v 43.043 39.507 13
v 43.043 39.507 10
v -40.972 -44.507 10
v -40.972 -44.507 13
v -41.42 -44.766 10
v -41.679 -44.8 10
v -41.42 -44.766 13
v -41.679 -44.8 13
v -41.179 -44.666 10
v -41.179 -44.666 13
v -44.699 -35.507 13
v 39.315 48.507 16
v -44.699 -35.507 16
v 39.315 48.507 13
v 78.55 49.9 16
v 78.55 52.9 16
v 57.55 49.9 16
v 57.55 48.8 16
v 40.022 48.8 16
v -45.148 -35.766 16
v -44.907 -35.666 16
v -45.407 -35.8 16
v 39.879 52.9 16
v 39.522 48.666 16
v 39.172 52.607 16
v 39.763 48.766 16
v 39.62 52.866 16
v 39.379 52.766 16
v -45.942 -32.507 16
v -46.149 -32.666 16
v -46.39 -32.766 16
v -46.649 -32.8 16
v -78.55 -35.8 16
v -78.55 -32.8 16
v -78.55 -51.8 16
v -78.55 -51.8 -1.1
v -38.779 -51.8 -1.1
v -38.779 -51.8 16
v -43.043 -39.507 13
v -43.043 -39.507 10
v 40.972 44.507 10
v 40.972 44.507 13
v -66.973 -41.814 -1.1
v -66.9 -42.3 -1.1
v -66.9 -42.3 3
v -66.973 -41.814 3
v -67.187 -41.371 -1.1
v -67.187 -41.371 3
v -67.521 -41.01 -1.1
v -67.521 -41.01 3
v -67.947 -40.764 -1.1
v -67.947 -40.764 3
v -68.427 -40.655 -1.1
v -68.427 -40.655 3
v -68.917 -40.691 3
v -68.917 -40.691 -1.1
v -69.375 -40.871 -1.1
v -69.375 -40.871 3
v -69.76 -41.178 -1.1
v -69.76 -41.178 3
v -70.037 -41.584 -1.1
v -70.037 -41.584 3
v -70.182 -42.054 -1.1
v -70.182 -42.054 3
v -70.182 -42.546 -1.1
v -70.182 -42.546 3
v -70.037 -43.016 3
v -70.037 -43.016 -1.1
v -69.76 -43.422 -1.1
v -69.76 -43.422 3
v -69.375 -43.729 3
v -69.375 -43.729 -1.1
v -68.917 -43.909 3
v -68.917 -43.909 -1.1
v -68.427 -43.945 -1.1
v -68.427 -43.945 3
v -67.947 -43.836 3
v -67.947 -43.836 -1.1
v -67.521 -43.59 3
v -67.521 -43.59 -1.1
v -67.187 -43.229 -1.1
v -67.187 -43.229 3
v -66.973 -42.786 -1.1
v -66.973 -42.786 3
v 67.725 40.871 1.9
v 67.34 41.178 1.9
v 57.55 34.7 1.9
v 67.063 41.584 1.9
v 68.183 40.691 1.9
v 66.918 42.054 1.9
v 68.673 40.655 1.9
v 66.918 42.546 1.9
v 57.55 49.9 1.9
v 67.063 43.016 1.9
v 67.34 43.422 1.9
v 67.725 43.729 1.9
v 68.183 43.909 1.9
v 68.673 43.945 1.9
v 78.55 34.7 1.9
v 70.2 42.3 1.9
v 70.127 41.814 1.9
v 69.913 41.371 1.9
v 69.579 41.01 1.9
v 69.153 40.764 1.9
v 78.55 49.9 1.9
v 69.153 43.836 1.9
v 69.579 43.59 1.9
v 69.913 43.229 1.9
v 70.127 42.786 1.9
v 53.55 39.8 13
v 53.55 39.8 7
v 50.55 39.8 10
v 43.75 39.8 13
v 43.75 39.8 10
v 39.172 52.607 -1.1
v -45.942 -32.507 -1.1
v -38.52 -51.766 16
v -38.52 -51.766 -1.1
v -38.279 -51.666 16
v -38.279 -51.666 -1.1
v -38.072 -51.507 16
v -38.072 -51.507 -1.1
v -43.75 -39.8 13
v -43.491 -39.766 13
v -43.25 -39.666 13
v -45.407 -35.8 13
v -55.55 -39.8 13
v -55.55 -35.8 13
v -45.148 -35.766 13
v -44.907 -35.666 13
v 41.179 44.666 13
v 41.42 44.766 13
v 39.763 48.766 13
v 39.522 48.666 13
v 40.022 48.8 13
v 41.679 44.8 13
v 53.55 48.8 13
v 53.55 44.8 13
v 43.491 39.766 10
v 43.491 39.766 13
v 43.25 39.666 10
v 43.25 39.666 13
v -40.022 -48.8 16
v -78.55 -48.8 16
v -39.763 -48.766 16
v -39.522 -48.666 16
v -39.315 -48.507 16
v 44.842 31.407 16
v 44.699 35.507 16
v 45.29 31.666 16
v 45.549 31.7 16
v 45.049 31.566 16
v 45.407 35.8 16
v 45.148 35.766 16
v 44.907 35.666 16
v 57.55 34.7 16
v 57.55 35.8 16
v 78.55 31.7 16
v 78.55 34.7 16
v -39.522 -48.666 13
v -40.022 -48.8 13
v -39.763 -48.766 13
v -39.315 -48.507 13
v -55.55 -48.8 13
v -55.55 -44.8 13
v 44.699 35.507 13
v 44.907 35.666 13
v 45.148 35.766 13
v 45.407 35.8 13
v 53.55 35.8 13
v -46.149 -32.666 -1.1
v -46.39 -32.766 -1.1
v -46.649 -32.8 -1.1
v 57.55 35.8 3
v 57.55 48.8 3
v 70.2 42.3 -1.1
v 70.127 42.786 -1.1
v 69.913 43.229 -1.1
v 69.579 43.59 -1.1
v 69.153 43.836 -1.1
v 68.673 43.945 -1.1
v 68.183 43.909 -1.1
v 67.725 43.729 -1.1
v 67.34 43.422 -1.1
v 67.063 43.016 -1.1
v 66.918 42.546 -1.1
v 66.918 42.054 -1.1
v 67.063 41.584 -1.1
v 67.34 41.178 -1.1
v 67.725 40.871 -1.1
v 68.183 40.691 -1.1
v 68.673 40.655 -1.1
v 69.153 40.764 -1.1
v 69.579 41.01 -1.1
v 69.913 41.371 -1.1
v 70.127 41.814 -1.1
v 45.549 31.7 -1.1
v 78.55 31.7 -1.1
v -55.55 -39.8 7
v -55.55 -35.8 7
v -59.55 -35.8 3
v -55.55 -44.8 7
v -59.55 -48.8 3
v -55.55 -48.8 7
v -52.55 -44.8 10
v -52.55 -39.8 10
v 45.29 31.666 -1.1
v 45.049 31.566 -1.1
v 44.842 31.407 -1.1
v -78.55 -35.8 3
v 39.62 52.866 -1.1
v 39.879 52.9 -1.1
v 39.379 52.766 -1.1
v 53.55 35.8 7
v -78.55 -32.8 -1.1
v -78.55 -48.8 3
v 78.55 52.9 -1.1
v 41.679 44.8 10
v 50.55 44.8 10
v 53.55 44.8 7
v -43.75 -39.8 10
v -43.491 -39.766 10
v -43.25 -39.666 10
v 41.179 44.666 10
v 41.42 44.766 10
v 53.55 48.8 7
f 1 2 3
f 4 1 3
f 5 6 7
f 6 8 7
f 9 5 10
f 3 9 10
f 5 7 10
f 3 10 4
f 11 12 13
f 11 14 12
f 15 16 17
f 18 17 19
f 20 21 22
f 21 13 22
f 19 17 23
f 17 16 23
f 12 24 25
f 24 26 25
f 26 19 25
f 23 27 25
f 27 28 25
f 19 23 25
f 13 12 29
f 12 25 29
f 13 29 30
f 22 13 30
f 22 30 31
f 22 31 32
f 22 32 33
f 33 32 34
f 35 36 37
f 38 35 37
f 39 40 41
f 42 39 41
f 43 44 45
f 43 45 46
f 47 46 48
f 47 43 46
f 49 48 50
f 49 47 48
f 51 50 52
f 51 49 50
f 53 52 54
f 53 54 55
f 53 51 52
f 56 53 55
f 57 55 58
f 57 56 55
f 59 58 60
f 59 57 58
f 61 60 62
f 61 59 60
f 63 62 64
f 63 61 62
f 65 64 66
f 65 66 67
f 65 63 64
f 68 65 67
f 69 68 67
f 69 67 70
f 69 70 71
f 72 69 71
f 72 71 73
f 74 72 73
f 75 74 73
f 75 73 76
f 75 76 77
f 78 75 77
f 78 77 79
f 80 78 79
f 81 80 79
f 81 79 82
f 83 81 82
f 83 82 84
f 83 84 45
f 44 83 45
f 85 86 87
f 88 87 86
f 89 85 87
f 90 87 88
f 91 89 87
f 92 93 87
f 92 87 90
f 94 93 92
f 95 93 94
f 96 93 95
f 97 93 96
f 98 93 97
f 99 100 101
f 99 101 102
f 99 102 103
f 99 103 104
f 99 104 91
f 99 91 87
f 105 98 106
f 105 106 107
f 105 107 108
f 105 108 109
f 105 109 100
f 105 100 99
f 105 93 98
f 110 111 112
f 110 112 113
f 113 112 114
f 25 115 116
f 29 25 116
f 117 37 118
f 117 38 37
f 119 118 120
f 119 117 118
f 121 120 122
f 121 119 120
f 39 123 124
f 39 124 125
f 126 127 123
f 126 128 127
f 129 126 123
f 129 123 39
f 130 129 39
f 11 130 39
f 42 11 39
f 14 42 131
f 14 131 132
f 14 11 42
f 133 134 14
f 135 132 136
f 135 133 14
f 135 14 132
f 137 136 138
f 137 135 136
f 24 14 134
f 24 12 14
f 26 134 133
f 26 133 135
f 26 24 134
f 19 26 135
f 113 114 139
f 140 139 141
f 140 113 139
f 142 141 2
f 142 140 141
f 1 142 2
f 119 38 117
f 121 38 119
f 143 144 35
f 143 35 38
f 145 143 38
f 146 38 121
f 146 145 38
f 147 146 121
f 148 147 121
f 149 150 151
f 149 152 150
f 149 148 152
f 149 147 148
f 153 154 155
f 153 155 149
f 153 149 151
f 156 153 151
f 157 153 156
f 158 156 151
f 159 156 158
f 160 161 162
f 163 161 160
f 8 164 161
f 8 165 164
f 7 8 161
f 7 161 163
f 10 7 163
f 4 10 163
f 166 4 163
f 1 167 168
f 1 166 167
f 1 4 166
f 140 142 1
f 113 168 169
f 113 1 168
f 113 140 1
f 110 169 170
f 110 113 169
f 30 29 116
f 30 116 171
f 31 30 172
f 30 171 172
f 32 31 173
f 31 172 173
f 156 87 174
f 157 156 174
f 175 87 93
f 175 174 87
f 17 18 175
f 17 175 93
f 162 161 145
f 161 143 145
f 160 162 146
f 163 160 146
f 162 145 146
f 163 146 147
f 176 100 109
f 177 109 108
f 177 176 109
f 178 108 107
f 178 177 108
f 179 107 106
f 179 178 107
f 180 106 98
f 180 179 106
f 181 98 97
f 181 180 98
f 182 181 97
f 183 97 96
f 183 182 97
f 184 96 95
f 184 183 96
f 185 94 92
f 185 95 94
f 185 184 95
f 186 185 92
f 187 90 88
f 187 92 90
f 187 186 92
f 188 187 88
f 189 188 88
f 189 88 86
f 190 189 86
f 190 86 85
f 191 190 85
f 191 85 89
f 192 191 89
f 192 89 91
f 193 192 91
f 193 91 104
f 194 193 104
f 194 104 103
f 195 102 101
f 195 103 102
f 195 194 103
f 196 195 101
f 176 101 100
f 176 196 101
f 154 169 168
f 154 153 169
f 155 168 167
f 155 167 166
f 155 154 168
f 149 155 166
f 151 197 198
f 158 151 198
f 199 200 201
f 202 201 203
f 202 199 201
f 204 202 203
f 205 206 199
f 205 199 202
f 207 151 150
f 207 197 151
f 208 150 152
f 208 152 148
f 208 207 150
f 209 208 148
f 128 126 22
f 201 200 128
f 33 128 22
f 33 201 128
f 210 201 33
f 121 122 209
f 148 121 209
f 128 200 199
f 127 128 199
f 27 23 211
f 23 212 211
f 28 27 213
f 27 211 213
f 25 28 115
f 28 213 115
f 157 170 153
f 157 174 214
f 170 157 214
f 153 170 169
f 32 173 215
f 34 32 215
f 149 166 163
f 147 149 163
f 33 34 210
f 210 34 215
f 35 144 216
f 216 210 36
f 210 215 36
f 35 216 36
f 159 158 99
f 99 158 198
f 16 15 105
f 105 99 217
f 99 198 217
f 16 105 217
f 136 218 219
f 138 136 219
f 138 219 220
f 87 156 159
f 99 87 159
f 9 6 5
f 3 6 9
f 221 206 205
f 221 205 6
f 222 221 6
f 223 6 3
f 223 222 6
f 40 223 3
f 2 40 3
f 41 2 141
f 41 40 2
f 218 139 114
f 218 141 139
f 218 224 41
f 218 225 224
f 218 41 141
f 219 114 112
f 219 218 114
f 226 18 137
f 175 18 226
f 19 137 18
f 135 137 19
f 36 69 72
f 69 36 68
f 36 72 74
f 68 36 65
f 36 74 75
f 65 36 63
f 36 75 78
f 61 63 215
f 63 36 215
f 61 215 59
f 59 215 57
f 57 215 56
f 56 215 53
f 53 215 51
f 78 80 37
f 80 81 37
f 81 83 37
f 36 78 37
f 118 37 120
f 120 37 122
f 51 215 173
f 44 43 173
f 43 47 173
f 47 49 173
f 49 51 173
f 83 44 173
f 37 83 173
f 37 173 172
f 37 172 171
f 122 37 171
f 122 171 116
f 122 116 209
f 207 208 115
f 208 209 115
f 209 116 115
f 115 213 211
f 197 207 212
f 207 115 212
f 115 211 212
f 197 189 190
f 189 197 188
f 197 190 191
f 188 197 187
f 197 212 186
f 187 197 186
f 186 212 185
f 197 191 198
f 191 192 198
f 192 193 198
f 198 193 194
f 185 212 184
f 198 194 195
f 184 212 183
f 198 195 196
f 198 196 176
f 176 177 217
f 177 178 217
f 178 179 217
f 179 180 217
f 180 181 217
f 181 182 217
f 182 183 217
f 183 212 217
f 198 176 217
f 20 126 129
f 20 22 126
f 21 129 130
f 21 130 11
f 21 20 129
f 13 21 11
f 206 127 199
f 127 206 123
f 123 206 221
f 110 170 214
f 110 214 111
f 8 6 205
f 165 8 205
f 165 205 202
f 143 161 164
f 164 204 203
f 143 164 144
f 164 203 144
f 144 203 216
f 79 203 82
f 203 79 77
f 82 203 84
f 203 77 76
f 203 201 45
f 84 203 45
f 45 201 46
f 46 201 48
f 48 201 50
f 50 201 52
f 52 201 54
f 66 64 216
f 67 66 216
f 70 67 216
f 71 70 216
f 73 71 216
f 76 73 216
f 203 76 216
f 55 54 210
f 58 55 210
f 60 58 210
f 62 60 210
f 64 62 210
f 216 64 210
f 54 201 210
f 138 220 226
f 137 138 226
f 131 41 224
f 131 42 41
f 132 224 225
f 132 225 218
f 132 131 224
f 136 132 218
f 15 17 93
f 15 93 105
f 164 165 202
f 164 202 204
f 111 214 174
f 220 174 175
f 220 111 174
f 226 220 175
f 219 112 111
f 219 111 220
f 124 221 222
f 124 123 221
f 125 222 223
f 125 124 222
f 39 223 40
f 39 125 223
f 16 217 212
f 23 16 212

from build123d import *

# Parameters (mm, degrees)
SKETCH_10_R         = 1.65
EXTRUDE_1_DEPTH     = 3
EXTRUDE_START       = 3
EXTRUDE_2_DEPTH     = 7
EXTRUDE_3_DEPTH     = 13
CHAMFER_1_SIZE      = 7
EXTRUDE_5_DEPTH     = 10
EXTRUDE_START_2     = -1.1
SKETCH_16_R         = 1.65
EXTRUDE_6_DEPTH     = 4.1
EXTRUDE_7_DEPTH     = 16
SKETCH_18_W         = 21
SKETCH_18_H         = 15.2
CUT_EXTRUDE_1_DEPTH = 14.1
FILLET_1_R          = 1


with BuildPart() as part:
    # 草图10 → 凸台-拉伸1 (new body)
    with BuildSketch(Plane.XY):
        Polygon((-78.55, -32.8), (-46.235028843, -32.8), (38.364971157, 51.8), (78.55, 51.8), (78.55, 32.8), (46.235028843, 32.8), (-38.364971157, -51.8), (-78.55, -51.8), align=None)
        with Locations((-68.55, -42.3)):
            Circle(SKETCH_10_R, mode=Mode.SUBTRACT)
        with Locations((68.55, 42.3)):
            Circle(SKETCH_10_R, mode=Mode.SUBTRACT)
    extrude(amount=EXTRUDE_1_DEPTH)

    # 草图11 → 凸台-拉伸2 (add)
    with BuildSketch(Plane.XY.offset(EXTRUDE_START)):
        Polygon((-59.55, -32.8), (-59.55, -51.8), (-38.364971157, -51.8), (46.235028843, 32.8), (57.55, 32.8), (57.55, 51.8), (38.364971157, 51.8), (-46.235028843, -32.8), align=None)
    extrude(amount=EXTRUDE_2_DEPTH)

    # 草图12 → 凸台-拉伸3 (add)
    with BuildSketch(Plane.XY.offset(EXTRUDE_START)):
        Polygon((-78.55, -32.8), (-46.235028843, -32.8), (38.364971157, 51.8), (78.55, 51.8), (78.55, 48.8), (39.607611845, 48.8), (-44.992388155, -35.8), (-78.55, -35.8), align=None)
        Polygon((-78.55, -48.8), (-78.55, -51.8), (-38.364971157, -51.8), (46.235028843, 32.8), (78.55, 32.8), (78.55, 35.8), (44.992388155, 35.8), (-39.607611845, -48.8), align=None)
    extrude(amount=EXTRUDE_3_DEPTH)

    # 倒角1
    chamfer_1_edges = [part.edges().sort_by_distance(p)[0] for p in [
        (57.55, 42.3, 10),
        (-59.55, -42.3, 10),
    ]]
    chamfer(chamfer_1_edges, length=CHAMFER_1_SIZE - 0.0001)  # a hair under: the kernel refuses the full size

    # 草图15 → 凸台-拉伸5 (add)
    with BuildSketch(Plane.XY.offset(3)):
        Polygon((-55.55, -35.8), (-55.55, -39.8), (-43.335533906, -39.8), (41.264466094, 44.8), (53.55, 44.8), (53.55, 48.8), (39.607611845, 48.8), (-44.992388155, -35.8), align=None)
        Polygon((-55.55, -44.8), (-55.55, -48.8), (-39.607611845, -48.8), (44.992388155, 35.8), (53.55, 35.8), (53.55, 39.8), (43.335533906, 39.8), (-41.264466094, -44.8), align=None)
    extrude(amount=EXTRUDE_5_DEPTH)

    # 草图16 → 凸台-拉伸6 (add)
    with BuildSketch(Plane.XY.offset(EXTRUDE_START_2)):
        Polygon((-78.55, -32.8), (-78.55, -51.8), (-38.364971157, -51.8), (45.135028843, 31.7), (78.55, 31.7), (78.55, 52.9), (39.464971157, 52.9), (-46.235028843, -32.8), align=None)
        with Locations((-68.55, -42.3)):
            Circle(SKETCH_16_R, mode=Mode.SUBTRACT)
        with Locations((68.55, 42.3)):
            Circle(SKETCH_16_R, mode=Mode.SUBTRACT)
    extrude(amount=EXTRUDE_6_DEPTH)

    # 草图17 → 凸台-拉伸7 (add)
    with BuildSketch(Plane.XY):
        Polygon((78.55, 52.9), (78.55, 48.8), (39.607611845, 48.8), (37.486291501, 50.921320344), (39.464971157, 52.9), align=None)
        Polygon((78.55, 31.7), (45.135028843, 31.7), (43.013708499, 33.821320344), (44.992388155, 35.8), (78.55, 35.8), align=None)
    extrude(amount=EXTRUDE_7_DEPTH)

    # 草图18 → 切除-拉伸1 (cut)
    with BuildSketch(Plane.XY.offset(16)):
        with Locations((68.05, 42.3)):
            Rectangle(SKETCH_18_W, SKETCH_18_H)
    extrude(amount=-CUT_EXTRUDE_1_DEPTH, mode=Mode.SUBTRACT)


with BuildPart() as cut_extrude_1_kept_piece:
    # of the separate pieces the step leaves, the one the design keeps (cut_extrude_1_pieces_kept)
    add(part.part.solids().sort_by_distance((-59.55, -48.8, 3.0001))[0])

    # 圆角1
    fillet_1_edges = [cut_extrude_1_kept_piece.edges().sort_by_distance(p)[0] for p in [
        (-46.235028843, -32.8, 7.45),
        (-38.364971157, -51.8, 7.45),
        (-43.335533906, -39.8, 11.5),
        (41.264466094, 44.8, 11.5),
        (-41.264466094, -44.8, 11.5),
        (43.335533906, 39.8, 11.5),
        (45.135028843, 31.7, 7.45),
        (39.464971157, 52.9, 7.45),
        (39.607611845, 48.8, 14.5),
        (-44.992388155, -35.8, 14.5),
        (-39.607611845, -48.8, 14.5),
        (44.992388155, 35.8, 14.5),
    ]]
    fillet(fillet_1_edges, radius=FILLET_1_R)


solid = cut_extrude_1_kept_piece.part
